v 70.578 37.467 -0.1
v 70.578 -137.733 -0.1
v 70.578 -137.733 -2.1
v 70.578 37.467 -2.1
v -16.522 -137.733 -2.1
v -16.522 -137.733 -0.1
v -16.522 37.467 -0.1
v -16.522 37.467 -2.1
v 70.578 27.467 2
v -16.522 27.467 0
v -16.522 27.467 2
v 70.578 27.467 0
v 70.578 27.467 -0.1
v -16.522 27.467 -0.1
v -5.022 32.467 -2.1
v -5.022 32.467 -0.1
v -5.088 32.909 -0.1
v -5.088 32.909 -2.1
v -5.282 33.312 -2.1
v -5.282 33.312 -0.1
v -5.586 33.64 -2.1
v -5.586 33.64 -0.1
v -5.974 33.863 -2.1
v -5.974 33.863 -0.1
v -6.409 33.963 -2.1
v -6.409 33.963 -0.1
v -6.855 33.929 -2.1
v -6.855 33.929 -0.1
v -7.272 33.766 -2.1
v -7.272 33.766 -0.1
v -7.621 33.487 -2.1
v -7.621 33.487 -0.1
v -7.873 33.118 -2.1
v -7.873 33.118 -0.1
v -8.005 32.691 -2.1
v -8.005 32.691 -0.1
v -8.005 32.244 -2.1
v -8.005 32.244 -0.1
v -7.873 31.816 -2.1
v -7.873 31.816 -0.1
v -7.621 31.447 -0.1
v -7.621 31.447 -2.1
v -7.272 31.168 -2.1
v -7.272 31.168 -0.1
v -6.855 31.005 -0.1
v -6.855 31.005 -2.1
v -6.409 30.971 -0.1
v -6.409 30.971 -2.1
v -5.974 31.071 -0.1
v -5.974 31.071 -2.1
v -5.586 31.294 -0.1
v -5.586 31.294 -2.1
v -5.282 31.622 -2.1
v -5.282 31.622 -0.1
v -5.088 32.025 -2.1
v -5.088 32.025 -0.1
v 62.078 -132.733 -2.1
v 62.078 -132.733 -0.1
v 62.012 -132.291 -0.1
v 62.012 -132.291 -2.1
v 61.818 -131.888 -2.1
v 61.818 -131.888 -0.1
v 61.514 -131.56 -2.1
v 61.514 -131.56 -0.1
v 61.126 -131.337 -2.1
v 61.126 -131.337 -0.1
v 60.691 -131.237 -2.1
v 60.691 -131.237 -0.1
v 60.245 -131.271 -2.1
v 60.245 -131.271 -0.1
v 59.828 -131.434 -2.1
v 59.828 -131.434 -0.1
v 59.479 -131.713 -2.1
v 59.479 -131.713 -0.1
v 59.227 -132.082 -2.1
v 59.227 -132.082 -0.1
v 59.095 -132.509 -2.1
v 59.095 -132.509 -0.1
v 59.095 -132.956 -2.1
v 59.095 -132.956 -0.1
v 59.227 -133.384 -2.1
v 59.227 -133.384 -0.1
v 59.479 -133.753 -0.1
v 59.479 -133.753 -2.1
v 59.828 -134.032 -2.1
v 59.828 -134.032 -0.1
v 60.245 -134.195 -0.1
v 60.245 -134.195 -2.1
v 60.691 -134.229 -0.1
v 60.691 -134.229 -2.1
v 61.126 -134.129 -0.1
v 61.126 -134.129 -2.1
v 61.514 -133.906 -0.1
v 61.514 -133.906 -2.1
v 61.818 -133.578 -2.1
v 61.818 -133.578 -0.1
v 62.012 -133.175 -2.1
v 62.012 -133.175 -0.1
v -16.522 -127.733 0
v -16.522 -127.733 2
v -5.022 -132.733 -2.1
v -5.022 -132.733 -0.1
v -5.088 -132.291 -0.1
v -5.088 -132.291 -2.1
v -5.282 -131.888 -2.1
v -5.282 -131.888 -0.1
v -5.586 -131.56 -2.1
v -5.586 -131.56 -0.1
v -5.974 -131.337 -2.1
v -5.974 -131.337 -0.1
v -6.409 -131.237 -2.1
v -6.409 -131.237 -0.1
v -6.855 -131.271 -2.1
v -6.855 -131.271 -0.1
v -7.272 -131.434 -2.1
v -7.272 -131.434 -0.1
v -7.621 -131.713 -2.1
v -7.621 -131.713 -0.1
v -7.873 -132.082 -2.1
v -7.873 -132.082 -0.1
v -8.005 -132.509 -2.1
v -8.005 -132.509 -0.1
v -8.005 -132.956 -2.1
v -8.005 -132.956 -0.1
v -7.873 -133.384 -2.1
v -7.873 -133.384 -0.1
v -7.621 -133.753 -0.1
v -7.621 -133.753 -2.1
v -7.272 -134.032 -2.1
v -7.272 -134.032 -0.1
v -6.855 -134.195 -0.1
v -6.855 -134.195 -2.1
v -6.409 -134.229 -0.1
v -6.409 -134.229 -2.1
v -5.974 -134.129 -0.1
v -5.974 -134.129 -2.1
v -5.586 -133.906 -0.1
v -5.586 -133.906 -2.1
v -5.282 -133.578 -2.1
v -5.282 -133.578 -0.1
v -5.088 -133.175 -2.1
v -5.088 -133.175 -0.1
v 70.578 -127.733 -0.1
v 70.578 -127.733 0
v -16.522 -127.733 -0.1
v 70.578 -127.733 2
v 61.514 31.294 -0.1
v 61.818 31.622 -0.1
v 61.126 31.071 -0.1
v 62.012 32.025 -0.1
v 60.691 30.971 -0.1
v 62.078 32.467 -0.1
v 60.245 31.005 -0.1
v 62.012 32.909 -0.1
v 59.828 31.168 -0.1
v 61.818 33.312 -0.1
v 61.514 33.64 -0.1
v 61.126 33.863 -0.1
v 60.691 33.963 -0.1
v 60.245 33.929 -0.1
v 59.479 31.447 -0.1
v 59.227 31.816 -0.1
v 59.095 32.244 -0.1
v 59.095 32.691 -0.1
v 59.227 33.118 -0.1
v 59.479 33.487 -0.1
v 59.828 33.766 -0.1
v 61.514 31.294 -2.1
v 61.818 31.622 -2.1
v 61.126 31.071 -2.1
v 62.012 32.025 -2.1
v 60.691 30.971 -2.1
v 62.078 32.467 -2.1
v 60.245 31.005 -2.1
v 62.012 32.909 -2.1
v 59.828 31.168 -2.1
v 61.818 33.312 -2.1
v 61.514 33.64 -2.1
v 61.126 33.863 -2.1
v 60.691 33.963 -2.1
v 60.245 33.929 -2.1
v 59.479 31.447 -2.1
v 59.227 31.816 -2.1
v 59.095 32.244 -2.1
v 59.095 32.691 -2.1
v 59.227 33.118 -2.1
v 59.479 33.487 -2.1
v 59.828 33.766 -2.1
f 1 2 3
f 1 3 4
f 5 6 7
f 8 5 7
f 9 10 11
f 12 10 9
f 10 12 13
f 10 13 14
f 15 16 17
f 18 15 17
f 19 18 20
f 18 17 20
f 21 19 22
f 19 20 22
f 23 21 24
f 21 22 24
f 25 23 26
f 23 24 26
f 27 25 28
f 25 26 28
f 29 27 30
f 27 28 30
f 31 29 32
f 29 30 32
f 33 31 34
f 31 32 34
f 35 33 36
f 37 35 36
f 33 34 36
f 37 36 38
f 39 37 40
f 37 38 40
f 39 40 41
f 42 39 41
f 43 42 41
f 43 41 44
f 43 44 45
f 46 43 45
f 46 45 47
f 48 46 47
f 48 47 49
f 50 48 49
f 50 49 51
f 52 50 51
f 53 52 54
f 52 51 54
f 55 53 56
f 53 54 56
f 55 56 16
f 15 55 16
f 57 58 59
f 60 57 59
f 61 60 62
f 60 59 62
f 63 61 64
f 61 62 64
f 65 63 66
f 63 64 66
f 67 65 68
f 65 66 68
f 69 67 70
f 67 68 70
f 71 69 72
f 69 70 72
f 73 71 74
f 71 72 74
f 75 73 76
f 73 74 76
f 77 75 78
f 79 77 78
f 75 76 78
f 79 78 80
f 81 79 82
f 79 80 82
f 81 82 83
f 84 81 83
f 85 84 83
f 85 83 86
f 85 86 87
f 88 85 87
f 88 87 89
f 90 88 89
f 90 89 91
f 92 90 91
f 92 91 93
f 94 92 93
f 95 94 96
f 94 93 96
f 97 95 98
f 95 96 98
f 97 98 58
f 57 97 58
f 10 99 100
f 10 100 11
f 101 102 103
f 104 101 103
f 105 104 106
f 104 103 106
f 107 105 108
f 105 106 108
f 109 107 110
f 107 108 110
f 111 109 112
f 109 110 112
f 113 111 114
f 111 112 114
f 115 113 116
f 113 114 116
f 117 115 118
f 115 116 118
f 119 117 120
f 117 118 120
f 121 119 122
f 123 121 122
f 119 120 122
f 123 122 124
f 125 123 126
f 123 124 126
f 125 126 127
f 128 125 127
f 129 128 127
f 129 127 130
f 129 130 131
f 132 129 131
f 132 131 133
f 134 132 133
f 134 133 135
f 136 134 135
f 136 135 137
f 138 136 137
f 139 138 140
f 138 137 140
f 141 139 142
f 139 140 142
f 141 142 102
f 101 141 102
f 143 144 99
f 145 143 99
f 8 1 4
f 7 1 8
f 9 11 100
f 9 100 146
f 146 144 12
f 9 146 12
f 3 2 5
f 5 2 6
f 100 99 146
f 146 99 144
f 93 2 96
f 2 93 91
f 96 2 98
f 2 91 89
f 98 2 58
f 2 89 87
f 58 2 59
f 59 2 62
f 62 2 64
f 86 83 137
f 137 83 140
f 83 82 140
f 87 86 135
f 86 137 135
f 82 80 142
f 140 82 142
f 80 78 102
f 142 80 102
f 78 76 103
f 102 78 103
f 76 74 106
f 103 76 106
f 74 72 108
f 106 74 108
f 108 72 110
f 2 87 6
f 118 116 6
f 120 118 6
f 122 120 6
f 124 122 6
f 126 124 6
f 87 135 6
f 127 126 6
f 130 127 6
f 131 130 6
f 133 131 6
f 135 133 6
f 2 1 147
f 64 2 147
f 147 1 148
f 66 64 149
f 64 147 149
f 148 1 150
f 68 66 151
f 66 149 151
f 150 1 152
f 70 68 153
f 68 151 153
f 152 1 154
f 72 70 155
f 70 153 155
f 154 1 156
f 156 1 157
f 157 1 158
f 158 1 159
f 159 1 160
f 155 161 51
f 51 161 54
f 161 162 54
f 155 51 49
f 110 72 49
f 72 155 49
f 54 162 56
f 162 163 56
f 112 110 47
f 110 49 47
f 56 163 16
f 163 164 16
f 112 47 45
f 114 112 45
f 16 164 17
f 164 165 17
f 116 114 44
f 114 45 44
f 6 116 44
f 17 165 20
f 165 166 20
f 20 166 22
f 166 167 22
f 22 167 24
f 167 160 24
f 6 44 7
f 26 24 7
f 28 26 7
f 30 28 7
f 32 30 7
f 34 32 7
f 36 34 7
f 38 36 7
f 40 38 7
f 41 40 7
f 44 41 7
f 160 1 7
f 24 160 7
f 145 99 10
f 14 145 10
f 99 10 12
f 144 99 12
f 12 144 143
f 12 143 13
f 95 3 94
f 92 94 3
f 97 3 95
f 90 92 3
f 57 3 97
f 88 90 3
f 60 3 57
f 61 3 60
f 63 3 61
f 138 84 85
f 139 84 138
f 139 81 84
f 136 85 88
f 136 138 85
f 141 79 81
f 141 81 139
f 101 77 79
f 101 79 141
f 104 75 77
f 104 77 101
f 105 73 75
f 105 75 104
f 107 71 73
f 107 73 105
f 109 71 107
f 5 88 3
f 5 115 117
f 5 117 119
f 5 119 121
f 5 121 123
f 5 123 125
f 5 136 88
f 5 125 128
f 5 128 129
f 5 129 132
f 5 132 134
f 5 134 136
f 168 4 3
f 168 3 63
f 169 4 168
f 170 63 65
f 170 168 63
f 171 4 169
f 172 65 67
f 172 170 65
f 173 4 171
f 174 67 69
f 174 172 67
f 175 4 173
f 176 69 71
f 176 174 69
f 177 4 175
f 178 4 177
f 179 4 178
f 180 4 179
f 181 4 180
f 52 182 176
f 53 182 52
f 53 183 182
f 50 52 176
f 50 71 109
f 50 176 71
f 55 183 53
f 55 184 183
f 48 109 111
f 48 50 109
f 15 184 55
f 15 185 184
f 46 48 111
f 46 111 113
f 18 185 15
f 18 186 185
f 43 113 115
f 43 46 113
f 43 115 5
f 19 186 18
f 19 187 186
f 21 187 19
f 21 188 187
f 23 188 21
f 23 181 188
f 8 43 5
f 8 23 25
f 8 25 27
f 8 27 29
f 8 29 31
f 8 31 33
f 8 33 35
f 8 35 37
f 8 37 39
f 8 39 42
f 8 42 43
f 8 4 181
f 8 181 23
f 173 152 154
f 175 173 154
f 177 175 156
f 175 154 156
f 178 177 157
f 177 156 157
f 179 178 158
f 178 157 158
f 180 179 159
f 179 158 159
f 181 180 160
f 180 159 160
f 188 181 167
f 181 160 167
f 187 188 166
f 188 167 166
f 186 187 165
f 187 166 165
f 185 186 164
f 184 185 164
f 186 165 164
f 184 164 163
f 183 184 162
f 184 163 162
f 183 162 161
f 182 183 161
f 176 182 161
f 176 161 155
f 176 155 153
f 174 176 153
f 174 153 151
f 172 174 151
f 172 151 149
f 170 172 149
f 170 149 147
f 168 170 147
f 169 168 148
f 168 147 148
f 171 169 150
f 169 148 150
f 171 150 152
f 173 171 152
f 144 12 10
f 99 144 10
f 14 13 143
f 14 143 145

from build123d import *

# Parameters (mm, degrees)
SKETCH1_W           = 87.1
SKETCH1_H           = 155.2
BOSS_EXTRUDE1_DEPTH = 2
SKETCH3_W           = 87.1
SKETCH3_H           = 155.2
BOSS_EXTRUDE3_DEPTH = 0.1
SKETCH4_W           = 87.1
SKETCH4_H           = 175.2
BOSS_EXTRUDE4_DEPTH = 2
SKETCH5_R           = 1.5
CUT_EXTRUDE1_DEPTH  = 2


with BuildPart() as part:
    # Sketch1 → Boss-Extrude1 (new body)
    with BuildSketch(Plane.XY):
        with Locations((27.028431373, -50.132892157)):
            Rectangle(SKETCH1_W, SKETCH1_H)
    extrude(amount=BOSS_EXTRUDE1_DEPTH)


with BuildPart() as body_2:
    # Sketch3 → Boss-Extrude3 (new body)
    with BuildSketch(Plane(origin=(0, 0, 0), x_dir=(-1, 0, 0), z_dir=(0, 0, -1))):
        with Locations((-27.028431373, -50.132892157)):
            Rectangle(SKETCH3_W, SKETCH3_H)
    extrude(amount=BOSS_EXTRUDE3_DEPTH)


with BuildPart() as body_3:
    # Sketch4 → Boss-Extrude4 (new body)
    with BuildSketch(Plane(origin=(0, 0, -0.1), x_dir=(-1, 0, 0), z_dir=(0, 0, -1))):
        with Locations((-27.028431373, -50.132892157)):
            Rectangle(SKETCH4_W, SKETCH4_H)
    extrude(amount=BOSS_EXTRUDE4_DEPTH)

    # Sketch5 → Cut-Extrude1 (cut)
    with BuildSketch(Plane.XY.offset(-0.1)):
        with Locations((-6.521568627, 32.467107843)):
            Circle(SKETCH5_R)
        with Locations((60.578431373, 32.467107843)):
            Circle(SKETCH5_R)
        with Locations((-6.521568627, -132.732892157)):
            Circle(SKETCH5_R)
        with Locations((60.578431373, -132.732892157)):
            Circle(SKETCH5_R)
    extrude(amount=-CUT_EXTRUDE1_DEPTH, mode=Mode.SUBTRACT)


solid = Compound([part.part, body_2.part, body_3.part])
